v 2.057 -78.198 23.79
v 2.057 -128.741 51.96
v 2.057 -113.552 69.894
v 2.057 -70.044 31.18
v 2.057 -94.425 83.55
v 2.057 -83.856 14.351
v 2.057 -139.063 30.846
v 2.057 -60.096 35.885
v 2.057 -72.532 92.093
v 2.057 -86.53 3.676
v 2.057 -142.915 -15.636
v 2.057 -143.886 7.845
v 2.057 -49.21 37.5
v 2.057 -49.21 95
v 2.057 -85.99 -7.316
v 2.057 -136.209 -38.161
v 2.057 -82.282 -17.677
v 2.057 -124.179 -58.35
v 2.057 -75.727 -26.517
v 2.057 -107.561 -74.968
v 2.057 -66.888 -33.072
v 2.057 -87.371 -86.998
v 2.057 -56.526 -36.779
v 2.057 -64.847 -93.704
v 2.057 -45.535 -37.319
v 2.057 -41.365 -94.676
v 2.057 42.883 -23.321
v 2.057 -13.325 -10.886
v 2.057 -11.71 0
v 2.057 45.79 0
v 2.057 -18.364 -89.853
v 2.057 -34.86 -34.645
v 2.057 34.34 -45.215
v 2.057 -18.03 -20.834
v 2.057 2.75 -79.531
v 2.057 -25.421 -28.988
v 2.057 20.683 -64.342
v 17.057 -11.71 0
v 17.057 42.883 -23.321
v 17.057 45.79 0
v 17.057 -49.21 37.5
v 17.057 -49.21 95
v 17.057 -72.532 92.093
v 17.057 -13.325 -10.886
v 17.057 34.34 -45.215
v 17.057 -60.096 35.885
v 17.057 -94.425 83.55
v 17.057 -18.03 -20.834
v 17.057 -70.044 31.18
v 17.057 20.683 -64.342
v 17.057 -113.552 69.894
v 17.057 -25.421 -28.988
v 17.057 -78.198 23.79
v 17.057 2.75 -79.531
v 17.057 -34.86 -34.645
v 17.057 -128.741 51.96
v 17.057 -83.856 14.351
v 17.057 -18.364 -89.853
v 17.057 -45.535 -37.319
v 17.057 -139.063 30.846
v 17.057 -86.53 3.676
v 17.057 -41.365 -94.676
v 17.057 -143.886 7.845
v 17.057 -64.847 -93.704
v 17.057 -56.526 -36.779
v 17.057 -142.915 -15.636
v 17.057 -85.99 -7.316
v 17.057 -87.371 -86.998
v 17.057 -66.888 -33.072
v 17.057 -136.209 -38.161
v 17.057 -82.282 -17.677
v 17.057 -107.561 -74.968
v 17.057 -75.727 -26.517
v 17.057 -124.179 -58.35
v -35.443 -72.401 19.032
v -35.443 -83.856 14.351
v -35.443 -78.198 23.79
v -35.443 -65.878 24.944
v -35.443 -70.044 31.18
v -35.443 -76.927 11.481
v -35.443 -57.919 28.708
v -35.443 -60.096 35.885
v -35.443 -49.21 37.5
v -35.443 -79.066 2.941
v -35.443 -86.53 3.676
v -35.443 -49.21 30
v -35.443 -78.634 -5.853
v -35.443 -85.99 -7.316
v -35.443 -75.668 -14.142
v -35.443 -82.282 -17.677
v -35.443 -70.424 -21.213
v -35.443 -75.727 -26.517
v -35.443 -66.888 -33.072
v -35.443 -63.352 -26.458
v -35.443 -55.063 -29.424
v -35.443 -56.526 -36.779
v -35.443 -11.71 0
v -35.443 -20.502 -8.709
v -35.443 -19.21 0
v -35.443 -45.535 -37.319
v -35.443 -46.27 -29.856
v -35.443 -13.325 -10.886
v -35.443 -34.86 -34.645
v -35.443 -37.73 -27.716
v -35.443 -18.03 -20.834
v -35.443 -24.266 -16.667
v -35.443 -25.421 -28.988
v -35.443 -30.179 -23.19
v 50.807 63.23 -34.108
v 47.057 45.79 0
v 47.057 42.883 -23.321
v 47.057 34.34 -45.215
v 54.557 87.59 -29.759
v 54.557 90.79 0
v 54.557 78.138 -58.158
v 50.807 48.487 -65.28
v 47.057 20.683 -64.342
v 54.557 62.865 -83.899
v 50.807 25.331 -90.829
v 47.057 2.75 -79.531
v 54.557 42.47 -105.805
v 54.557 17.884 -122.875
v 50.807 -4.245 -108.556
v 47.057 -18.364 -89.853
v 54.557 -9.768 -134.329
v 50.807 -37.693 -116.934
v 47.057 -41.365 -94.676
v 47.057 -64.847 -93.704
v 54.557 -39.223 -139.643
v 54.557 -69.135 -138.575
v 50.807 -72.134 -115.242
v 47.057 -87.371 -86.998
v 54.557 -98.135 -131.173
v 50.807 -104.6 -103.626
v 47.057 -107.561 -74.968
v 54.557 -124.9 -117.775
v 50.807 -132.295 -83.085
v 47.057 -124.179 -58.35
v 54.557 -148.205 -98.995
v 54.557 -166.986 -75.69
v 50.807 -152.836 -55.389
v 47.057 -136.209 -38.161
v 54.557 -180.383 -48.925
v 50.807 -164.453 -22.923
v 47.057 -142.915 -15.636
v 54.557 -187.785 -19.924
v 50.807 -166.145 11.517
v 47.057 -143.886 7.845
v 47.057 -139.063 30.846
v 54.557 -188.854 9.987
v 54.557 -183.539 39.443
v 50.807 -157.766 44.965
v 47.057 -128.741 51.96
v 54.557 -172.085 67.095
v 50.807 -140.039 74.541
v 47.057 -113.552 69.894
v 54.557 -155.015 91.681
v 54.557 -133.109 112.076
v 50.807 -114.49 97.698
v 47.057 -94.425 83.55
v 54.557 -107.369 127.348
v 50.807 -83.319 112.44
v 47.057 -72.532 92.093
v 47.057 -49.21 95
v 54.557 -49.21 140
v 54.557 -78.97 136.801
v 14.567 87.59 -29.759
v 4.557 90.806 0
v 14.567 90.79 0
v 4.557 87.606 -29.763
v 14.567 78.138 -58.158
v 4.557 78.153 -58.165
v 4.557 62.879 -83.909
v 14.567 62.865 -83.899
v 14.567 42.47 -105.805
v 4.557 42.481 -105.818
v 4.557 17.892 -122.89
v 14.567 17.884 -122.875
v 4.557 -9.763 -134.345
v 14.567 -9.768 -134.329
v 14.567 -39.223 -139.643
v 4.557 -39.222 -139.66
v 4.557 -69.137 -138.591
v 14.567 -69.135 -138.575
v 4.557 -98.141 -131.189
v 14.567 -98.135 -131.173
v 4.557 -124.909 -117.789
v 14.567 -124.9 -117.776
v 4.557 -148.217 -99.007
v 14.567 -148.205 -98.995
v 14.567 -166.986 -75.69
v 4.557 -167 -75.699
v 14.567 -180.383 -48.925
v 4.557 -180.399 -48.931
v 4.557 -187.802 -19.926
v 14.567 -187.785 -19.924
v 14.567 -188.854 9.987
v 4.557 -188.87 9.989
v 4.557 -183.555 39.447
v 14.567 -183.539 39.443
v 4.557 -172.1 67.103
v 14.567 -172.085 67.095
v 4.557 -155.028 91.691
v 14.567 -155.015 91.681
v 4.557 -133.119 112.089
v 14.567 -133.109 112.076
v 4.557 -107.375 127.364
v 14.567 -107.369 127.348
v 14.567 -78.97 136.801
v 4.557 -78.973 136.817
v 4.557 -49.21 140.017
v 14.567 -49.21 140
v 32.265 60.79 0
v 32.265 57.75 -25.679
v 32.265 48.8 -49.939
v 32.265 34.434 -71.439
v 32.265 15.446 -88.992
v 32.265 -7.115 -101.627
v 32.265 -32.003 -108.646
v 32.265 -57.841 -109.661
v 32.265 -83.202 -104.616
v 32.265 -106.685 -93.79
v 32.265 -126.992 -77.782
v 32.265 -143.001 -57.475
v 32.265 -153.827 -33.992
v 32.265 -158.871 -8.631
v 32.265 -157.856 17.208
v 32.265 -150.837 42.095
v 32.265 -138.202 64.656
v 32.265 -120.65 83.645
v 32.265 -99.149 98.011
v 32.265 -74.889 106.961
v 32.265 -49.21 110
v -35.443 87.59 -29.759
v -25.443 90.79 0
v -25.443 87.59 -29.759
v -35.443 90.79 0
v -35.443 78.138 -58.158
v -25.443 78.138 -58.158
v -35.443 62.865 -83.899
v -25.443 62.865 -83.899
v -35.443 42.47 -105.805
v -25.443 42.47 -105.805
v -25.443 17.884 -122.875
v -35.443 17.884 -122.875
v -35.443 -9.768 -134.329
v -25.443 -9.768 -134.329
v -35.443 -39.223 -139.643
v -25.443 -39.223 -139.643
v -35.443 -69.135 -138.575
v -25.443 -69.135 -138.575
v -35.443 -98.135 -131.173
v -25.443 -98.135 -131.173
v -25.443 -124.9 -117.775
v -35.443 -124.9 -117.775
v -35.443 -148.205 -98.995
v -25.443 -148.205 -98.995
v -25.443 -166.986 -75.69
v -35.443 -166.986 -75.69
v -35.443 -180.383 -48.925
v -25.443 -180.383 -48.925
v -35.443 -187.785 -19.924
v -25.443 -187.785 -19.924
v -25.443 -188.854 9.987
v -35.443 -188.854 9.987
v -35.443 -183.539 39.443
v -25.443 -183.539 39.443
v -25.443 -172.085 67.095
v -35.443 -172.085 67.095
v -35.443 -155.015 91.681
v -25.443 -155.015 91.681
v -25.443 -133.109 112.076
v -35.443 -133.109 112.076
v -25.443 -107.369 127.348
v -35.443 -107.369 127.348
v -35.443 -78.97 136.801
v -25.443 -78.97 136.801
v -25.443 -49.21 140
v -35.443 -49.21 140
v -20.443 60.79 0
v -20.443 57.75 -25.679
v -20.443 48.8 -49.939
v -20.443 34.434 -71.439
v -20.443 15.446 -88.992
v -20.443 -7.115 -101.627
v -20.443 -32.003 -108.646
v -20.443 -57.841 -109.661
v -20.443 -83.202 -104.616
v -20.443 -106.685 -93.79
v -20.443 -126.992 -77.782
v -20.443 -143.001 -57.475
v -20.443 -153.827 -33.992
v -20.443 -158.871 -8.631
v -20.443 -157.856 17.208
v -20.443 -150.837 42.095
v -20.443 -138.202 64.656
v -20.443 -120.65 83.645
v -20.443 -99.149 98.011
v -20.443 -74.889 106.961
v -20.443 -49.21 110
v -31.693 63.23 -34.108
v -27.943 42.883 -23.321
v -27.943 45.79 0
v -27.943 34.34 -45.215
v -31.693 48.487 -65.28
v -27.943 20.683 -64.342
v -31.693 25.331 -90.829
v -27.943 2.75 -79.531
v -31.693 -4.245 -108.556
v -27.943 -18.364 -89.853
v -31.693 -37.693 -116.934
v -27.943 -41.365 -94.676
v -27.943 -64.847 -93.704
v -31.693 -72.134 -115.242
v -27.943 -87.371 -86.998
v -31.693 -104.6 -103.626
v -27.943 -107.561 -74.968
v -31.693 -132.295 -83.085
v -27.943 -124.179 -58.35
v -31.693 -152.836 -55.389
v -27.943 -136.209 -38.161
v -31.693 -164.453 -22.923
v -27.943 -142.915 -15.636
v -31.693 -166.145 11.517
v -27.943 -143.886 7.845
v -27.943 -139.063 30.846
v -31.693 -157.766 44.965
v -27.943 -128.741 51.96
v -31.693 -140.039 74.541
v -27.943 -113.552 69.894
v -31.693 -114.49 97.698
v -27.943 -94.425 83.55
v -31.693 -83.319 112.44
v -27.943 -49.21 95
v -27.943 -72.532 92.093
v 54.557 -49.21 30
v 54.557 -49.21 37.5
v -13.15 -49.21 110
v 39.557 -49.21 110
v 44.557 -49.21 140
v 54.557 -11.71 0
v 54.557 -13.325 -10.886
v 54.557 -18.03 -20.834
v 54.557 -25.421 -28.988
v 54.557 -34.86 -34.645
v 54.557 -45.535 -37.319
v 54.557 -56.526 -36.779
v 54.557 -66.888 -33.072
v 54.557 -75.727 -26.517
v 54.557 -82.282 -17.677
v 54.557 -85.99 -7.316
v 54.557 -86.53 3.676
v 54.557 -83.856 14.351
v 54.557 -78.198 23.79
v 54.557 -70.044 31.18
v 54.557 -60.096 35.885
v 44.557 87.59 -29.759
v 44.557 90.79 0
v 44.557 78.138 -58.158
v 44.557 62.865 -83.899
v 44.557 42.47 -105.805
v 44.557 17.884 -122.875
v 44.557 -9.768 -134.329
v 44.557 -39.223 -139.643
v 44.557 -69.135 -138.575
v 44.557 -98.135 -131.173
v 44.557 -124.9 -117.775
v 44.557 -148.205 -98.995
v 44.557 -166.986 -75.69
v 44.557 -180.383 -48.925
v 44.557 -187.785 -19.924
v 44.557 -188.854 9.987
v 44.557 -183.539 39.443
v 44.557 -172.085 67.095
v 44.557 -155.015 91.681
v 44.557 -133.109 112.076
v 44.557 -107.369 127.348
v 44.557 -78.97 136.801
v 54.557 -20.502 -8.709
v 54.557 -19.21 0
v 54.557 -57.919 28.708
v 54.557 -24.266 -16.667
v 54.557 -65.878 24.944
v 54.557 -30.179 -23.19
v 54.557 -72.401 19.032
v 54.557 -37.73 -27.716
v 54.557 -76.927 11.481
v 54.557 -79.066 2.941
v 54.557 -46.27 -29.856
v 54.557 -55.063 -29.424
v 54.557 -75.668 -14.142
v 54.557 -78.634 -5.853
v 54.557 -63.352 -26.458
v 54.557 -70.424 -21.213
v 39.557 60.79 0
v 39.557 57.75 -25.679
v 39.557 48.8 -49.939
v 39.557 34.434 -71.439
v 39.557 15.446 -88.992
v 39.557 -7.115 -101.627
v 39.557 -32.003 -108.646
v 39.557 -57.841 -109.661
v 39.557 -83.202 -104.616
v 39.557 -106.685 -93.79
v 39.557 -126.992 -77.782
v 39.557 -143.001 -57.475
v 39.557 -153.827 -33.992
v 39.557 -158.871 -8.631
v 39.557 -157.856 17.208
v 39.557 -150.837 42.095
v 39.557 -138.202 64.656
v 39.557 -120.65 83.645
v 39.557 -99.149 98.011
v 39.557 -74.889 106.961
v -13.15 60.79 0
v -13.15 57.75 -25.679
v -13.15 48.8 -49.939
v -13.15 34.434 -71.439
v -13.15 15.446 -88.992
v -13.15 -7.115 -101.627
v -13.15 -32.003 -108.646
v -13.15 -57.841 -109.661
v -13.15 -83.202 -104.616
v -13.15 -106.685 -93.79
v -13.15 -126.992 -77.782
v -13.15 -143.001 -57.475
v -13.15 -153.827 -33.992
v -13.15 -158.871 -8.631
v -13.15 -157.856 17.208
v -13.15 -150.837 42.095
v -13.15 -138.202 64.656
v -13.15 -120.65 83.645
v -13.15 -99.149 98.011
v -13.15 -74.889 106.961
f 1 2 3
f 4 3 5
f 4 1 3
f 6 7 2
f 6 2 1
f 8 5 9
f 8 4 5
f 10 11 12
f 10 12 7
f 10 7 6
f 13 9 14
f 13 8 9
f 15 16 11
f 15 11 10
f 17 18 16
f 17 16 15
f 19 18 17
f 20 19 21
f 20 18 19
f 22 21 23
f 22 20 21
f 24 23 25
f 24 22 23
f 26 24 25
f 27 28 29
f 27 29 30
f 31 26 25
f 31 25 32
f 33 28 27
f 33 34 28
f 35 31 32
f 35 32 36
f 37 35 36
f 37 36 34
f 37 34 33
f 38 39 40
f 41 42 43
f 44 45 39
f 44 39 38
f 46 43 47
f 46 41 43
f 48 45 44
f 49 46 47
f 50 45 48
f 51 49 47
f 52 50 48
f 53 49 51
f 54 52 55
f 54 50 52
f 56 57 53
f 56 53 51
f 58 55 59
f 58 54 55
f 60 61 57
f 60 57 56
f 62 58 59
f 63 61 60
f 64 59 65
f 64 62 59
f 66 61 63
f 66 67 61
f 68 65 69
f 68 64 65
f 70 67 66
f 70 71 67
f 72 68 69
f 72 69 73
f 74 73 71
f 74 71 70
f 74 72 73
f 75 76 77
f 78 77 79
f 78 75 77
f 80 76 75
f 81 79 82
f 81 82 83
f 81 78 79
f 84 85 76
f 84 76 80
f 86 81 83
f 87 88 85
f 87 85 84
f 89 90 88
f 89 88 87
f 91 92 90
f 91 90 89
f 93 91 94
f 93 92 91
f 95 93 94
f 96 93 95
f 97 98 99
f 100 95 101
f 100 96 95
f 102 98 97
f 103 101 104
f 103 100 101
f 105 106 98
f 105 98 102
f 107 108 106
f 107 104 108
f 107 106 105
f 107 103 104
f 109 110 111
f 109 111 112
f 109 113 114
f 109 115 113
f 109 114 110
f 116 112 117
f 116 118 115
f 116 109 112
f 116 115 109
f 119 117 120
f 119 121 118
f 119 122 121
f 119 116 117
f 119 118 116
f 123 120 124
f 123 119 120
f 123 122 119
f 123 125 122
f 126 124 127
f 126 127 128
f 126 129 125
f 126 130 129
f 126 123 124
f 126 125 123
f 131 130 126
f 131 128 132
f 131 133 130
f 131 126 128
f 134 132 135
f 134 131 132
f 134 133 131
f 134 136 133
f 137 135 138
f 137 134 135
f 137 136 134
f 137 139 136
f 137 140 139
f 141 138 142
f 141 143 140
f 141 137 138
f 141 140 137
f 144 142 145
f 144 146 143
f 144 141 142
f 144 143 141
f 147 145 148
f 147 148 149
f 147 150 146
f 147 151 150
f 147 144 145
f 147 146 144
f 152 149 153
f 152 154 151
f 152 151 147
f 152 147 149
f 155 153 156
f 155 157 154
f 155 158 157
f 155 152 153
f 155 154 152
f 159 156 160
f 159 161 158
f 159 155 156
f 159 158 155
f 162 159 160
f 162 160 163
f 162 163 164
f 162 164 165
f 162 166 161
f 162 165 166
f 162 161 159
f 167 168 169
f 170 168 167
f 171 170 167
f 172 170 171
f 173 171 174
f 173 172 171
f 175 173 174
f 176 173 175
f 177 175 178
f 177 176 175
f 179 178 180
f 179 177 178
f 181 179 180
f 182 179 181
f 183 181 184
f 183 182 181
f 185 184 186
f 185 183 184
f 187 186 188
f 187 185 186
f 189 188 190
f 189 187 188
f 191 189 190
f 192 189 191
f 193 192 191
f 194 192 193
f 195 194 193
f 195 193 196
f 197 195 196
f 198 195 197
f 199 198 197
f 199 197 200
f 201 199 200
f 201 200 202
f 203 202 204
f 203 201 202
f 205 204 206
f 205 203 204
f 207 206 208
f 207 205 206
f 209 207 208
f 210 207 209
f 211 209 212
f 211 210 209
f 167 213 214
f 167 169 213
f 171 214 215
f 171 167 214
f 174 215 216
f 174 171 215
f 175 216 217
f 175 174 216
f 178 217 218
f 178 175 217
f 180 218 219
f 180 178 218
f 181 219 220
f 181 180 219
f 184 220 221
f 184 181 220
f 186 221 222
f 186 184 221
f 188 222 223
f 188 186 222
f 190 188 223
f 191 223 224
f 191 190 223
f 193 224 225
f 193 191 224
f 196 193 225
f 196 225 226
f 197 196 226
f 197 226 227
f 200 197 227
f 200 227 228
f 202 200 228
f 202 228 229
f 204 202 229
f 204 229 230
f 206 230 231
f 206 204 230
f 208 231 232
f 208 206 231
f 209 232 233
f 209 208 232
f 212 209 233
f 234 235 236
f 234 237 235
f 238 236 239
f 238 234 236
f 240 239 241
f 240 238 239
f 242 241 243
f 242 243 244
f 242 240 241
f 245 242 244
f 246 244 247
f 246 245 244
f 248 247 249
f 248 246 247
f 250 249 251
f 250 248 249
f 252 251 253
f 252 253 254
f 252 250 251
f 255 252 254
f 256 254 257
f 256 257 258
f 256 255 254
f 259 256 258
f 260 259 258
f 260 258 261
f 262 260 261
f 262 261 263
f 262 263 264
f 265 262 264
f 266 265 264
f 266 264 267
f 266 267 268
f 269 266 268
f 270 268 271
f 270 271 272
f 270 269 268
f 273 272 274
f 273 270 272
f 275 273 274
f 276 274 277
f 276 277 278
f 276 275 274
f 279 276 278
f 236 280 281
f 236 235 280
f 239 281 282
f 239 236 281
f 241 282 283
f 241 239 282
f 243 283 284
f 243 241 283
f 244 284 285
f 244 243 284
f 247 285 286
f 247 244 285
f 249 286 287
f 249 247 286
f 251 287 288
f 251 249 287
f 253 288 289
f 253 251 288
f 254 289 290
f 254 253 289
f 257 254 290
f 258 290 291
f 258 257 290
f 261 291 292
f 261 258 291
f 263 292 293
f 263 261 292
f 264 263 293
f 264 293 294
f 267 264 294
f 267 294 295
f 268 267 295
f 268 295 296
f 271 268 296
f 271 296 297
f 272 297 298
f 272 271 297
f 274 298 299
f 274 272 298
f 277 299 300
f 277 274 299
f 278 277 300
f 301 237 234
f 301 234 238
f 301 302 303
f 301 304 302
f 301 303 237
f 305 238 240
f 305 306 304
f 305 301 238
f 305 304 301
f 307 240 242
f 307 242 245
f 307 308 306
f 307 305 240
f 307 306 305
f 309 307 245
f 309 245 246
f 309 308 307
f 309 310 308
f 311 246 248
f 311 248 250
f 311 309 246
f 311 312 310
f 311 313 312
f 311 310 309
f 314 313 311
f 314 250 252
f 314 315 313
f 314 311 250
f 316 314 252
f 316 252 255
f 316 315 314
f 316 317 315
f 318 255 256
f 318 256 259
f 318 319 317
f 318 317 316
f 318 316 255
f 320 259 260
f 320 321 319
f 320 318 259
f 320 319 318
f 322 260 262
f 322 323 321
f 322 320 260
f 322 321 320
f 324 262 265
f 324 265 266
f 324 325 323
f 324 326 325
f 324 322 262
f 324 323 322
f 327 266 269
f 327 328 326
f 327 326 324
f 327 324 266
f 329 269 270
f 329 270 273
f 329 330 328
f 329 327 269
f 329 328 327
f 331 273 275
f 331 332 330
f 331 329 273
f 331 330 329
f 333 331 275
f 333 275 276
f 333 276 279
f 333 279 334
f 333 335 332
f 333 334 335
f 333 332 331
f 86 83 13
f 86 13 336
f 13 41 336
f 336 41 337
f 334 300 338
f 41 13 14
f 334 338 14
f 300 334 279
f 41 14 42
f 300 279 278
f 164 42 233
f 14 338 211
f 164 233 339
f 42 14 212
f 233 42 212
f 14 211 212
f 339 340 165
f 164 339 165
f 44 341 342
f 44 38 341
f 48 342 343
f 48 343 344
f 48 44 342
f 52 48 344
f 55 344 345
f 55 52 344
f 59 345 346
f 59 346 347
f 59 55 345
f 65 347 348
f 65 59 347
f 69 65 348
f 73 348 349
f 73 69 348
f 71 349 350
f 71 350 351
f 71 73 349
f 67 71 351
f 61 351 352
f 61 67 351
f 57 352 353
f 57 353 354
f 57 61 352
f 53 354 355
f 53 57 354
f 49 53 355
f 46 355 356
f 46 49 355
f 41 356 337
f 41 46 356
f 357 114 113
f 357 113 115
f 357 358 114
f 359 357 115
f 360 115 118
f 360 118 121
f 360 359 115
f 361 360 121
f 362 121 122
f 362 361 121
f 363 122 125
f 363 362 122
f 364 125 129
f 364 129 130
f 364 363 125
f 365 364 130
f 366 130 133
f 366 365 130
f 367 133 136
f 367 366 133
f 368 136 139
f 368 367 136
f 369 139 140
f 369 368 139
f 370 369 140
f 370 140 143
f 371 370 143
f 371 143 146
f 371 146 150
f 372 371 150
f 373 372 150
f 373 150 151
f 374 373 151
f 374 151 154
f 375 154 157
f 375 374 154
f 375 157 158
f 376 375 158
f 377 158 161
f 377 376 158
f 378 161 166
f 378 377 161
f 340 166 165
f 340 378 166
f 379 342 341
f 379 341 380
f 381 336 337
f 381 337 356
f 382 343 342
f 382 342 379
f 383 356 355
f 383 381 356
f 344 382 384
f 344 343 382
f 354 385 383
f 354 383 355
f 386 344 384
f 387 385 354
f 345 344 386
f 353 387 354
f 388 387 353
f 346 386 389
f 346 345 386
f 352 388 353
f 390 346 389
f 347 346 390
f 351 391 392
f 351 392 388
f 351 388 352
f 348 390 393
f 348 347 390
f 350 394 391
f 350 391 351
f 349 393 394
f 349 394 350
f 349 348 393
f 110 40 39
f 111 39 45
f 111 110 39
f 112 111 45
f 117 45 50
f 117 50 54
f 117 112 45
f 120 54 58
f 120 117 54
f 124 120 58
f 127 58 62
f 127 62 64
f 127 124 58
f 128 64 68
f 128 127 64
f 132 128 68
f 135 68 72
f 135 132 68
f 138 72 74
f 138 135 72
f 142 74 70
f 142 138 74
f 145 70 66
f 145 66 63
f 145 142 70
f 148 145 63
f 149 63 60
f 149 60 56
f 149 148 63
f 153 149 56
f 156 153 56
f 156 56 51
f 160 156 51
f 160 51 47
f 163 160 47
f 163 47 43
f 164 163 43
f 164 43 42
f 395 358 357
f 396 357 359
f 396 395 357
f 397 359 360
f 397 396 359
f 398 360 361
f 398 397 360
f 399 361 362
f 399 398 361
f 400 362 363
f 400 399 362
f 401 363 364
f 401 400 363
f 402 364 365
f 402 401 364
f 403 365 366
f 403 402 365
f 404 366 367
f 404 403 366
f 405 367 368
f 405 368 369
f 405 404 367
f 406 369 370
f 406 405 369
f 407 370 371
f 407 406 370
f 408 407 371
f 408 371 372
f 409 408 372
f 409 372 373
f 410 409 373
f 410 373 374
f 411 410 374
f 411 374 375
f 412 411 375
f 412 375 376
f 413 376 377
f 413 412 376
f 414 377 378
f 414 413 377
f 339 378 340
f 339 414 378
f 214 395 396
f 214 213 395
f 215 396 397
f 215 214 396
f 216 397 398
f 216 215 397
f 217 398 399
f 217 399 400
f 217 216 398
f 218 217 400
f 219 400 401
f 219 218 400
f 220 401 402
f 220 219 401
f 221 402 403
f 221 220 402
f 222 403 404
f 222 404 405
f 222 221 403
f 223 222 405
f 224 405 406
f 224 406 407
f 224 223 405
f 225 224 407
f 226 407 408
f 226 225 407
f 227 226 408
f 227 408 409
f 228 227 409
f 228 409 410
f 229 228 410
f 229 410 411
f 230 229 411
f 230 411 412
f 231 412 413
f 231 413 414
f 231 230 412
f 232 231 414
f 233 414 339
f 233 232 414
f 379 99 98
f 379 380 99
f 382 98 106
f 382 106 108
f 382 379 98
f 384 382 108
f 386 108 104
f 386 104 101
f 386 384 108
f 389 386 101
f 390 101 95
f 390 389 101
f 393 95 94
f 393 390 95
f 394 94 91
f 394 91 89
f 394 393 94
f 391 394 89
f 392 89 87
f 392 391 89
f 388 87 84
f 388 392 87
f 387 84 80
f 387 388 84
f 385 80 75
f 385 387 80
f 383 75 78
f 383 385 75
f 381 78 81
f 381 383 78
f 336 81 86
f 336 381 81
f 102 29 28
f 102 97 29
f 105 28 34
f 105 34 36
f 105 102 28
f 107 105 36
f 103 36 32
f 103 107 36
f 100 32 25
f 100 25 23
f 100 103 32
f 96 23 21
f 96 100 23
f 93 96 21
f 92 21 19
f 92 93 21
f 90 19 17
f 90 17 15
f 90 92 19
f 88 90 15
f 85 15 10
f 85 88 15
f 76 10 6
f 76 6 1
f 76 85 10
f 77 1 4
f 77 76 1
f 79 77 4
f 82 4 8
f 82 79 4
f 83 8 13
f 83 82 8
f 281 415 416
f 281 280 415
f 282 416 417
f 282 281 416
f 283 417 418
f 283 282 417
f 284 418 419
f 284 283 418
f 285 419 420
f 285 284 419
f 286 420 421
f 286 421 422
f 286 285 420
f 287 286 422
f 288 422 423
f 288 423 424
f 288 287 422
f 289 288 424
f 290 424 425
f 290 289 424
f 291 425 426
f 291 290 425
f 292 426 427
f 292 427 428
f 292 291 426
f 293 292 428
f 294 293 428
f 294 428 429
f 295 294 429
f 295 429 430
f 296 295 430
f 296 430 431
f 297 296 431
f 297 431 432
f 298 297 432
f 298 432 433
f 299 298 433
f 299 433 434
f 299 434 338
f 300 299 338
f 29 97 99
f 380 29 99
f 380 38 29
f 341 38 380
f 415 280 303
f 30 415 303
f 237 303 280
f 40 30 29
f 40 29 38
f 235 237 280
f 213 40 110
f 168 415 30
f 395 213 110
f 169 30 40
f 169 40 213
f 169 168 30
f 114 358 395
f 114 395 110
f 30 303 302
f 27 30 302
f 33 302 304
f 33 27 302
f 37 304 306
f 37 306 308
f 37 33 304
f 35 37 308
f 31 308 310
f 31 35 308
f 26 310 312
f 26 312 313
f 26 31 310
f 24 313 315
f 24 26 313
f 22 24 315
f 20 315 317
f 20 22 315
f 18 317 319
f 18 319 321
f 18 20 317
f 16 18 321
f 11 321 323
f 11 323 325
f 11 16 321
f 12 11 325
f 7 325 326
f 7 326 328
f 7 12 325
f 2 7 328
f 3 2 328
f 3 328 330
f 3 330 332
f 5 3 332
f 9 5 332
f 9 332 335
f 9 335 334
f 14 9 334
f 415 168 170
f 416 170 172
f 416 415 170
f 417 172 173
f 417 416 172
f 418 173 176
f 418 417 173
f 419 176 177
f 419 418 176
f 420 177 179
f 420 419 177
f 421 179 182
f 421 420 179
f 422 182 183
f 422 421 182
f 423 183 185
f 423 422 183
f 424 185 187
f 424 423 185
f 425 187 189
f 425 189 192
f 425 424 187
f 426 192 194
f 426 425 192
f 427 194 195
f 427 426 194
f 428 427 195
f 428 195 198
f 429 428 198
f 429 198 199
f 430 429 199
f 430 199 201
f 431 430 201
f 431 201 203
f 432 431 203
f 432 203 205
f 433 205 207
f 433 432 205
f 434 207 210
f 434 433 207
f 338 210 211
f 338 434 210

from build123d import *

# Parameters (mm, degrees)
REVOLVE5_ANGLE = 270


with BuildPart() as part:
    # Sketch1 → Revolve5 (revolve)
    with BuildSketch(Plane.XY):
        Polygon((-35.442504871, -11.710433312), (-35.442504871, -19.210433312), (54.557495129, -19.210433312), (54.557495129, -11.710433312), (17.057495129, -11.710433312), (17.057495129, 45.789566688), (47.057495129, 45.789566688), (54.557495129, 90.789566688), (44.557495129, 90.789566688), (39.557495129, 60.789566688), (32.265242588, 60.789566688), (14.567304664, 90.789573408), (4.557495129, 90.80620168), (-13.15025233, 60.789566688), (-20.442504871, 60.789566688), (-25.442504871, 90.789566688), (-35.442504871, 90.789566688), (-27.942504871, 45.789566688), (2.057495129, 45.789566688), (2.057495129, -11.710433312), align=None)
    revolve(axis=Axis((-35.442504871, -49.210433312, 0), (-1, 0, 0)), revolution_arc=REVOLVE5_ANGLE)


solid = part.part
